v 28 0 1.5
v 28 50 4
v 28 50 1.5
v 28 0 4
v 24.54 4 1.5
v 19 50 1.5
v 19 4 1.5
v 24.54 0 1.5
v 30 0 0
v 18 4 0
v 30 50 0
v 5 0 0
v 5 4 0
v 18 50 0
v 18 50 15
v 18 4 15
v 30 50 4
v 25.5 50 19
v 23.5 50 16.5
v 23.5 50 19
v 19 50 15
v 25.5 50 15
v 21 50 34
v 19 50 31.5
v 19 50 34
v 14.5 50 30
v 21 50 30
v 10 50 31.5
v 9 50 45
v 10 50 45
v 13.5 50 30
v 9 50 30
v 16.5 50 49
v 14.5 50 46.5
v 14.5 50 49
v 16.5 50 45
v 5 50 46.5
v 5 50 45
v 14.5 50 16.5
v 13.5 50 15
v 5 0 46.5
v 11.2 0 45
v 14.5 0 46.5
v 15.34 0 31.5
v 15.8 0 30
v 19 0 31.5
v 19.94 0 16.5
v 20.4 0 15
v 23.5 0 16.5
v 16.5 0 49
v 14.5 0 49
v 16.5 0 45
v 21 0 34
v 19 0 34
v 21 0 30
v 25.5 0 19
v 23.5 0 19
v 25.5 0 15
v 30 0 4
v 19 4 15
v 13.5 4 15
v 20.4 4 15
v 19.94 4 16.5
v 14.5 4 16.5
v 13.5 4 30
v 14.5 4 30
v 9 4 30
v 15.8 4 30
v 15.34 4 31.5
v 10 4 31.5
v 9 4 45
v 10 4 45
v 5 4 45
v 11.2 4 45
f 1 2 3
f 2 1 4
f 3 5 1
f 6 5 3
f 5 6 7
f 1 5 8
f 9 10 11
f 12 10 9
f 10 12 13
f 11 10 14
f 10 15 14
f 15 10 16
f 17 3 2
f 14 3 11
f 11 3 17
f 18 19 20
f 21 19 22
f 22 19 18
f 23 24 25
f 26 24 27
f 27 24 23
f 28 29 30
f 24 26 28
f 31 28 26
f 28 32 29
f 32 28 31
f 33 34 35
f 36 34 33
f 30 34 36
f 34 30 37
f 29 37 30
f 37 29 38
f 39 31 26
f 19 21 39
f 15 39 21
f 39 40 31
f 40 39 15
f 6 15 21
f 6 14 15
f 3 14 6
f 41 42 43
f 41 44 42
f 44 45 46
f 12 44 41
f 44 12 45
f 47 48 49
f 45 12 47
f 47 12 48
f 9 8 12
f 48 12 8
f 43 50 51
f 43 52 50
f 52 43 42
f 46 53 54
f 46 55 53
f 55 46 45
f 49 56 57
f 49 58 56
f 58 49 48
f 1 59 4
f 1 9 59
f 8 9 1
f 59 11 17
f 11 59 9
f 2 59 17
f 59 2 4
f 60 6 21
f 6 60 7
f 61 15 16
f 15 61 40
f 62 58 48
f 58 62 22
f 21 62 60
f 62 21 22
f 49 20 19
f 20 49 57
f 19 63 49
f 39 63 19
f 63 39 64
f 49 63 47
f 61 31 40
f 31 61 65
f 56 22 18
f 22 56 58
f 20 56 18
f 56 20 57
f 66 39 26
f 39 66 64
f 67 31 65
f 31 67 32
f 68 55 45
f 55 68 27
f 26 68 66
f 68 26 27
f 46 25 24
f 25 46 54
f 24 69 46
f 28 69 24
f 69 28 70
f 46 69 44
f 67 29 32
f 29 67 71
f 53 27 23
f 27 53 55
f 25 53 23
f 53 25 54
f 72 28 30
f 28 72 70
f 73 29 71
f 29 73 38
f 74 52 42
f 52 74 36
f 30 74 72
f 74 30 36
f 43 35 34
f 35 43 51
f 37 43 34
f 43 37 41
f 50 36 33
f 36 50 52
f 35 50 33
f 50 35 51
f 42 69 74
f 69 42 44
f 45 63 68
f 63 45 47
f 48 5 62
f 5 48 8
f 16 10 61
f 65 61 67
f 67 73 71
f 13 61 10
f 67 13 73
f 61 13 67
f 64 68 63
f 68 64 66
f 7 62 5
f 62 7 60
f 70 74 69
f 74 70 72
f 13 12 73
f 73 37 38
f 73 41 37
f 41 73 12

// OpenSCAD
wall = 0.6;


difference() {
    union() {
color([1,0,0]) translate([0,4,0]) rotate([90,0,0]) 
    linear_extrude(4) polygon(points=[[0,0],[25,0],[2,75],[0,75]]);		 

for (ii = [0:4]) translate([0,0,ii*15]) {
    xx = 18-ii*4.5;
    color([0,1,0]) translate([xx, 0, 0]) cube([10,50,1.5]);    
    translate([xx+10 ,0, 0]) cube([2,50,4]);    
    translate([xx, 0, 0]) cube([1,50,15]);        
}
translate([0,0,75]) cube([3,50,1.5]);
translate([3,0,75]) cube([2,50,4]);
}
 translate([0,0,46.5]) cube([14.5,50,40]);
cube([5,50,80]);
//color ([0,0,1]) translate([0,50 -  sin(15)*40,0])  rotate([0,0,15]) cube([50,20,80]);
}
